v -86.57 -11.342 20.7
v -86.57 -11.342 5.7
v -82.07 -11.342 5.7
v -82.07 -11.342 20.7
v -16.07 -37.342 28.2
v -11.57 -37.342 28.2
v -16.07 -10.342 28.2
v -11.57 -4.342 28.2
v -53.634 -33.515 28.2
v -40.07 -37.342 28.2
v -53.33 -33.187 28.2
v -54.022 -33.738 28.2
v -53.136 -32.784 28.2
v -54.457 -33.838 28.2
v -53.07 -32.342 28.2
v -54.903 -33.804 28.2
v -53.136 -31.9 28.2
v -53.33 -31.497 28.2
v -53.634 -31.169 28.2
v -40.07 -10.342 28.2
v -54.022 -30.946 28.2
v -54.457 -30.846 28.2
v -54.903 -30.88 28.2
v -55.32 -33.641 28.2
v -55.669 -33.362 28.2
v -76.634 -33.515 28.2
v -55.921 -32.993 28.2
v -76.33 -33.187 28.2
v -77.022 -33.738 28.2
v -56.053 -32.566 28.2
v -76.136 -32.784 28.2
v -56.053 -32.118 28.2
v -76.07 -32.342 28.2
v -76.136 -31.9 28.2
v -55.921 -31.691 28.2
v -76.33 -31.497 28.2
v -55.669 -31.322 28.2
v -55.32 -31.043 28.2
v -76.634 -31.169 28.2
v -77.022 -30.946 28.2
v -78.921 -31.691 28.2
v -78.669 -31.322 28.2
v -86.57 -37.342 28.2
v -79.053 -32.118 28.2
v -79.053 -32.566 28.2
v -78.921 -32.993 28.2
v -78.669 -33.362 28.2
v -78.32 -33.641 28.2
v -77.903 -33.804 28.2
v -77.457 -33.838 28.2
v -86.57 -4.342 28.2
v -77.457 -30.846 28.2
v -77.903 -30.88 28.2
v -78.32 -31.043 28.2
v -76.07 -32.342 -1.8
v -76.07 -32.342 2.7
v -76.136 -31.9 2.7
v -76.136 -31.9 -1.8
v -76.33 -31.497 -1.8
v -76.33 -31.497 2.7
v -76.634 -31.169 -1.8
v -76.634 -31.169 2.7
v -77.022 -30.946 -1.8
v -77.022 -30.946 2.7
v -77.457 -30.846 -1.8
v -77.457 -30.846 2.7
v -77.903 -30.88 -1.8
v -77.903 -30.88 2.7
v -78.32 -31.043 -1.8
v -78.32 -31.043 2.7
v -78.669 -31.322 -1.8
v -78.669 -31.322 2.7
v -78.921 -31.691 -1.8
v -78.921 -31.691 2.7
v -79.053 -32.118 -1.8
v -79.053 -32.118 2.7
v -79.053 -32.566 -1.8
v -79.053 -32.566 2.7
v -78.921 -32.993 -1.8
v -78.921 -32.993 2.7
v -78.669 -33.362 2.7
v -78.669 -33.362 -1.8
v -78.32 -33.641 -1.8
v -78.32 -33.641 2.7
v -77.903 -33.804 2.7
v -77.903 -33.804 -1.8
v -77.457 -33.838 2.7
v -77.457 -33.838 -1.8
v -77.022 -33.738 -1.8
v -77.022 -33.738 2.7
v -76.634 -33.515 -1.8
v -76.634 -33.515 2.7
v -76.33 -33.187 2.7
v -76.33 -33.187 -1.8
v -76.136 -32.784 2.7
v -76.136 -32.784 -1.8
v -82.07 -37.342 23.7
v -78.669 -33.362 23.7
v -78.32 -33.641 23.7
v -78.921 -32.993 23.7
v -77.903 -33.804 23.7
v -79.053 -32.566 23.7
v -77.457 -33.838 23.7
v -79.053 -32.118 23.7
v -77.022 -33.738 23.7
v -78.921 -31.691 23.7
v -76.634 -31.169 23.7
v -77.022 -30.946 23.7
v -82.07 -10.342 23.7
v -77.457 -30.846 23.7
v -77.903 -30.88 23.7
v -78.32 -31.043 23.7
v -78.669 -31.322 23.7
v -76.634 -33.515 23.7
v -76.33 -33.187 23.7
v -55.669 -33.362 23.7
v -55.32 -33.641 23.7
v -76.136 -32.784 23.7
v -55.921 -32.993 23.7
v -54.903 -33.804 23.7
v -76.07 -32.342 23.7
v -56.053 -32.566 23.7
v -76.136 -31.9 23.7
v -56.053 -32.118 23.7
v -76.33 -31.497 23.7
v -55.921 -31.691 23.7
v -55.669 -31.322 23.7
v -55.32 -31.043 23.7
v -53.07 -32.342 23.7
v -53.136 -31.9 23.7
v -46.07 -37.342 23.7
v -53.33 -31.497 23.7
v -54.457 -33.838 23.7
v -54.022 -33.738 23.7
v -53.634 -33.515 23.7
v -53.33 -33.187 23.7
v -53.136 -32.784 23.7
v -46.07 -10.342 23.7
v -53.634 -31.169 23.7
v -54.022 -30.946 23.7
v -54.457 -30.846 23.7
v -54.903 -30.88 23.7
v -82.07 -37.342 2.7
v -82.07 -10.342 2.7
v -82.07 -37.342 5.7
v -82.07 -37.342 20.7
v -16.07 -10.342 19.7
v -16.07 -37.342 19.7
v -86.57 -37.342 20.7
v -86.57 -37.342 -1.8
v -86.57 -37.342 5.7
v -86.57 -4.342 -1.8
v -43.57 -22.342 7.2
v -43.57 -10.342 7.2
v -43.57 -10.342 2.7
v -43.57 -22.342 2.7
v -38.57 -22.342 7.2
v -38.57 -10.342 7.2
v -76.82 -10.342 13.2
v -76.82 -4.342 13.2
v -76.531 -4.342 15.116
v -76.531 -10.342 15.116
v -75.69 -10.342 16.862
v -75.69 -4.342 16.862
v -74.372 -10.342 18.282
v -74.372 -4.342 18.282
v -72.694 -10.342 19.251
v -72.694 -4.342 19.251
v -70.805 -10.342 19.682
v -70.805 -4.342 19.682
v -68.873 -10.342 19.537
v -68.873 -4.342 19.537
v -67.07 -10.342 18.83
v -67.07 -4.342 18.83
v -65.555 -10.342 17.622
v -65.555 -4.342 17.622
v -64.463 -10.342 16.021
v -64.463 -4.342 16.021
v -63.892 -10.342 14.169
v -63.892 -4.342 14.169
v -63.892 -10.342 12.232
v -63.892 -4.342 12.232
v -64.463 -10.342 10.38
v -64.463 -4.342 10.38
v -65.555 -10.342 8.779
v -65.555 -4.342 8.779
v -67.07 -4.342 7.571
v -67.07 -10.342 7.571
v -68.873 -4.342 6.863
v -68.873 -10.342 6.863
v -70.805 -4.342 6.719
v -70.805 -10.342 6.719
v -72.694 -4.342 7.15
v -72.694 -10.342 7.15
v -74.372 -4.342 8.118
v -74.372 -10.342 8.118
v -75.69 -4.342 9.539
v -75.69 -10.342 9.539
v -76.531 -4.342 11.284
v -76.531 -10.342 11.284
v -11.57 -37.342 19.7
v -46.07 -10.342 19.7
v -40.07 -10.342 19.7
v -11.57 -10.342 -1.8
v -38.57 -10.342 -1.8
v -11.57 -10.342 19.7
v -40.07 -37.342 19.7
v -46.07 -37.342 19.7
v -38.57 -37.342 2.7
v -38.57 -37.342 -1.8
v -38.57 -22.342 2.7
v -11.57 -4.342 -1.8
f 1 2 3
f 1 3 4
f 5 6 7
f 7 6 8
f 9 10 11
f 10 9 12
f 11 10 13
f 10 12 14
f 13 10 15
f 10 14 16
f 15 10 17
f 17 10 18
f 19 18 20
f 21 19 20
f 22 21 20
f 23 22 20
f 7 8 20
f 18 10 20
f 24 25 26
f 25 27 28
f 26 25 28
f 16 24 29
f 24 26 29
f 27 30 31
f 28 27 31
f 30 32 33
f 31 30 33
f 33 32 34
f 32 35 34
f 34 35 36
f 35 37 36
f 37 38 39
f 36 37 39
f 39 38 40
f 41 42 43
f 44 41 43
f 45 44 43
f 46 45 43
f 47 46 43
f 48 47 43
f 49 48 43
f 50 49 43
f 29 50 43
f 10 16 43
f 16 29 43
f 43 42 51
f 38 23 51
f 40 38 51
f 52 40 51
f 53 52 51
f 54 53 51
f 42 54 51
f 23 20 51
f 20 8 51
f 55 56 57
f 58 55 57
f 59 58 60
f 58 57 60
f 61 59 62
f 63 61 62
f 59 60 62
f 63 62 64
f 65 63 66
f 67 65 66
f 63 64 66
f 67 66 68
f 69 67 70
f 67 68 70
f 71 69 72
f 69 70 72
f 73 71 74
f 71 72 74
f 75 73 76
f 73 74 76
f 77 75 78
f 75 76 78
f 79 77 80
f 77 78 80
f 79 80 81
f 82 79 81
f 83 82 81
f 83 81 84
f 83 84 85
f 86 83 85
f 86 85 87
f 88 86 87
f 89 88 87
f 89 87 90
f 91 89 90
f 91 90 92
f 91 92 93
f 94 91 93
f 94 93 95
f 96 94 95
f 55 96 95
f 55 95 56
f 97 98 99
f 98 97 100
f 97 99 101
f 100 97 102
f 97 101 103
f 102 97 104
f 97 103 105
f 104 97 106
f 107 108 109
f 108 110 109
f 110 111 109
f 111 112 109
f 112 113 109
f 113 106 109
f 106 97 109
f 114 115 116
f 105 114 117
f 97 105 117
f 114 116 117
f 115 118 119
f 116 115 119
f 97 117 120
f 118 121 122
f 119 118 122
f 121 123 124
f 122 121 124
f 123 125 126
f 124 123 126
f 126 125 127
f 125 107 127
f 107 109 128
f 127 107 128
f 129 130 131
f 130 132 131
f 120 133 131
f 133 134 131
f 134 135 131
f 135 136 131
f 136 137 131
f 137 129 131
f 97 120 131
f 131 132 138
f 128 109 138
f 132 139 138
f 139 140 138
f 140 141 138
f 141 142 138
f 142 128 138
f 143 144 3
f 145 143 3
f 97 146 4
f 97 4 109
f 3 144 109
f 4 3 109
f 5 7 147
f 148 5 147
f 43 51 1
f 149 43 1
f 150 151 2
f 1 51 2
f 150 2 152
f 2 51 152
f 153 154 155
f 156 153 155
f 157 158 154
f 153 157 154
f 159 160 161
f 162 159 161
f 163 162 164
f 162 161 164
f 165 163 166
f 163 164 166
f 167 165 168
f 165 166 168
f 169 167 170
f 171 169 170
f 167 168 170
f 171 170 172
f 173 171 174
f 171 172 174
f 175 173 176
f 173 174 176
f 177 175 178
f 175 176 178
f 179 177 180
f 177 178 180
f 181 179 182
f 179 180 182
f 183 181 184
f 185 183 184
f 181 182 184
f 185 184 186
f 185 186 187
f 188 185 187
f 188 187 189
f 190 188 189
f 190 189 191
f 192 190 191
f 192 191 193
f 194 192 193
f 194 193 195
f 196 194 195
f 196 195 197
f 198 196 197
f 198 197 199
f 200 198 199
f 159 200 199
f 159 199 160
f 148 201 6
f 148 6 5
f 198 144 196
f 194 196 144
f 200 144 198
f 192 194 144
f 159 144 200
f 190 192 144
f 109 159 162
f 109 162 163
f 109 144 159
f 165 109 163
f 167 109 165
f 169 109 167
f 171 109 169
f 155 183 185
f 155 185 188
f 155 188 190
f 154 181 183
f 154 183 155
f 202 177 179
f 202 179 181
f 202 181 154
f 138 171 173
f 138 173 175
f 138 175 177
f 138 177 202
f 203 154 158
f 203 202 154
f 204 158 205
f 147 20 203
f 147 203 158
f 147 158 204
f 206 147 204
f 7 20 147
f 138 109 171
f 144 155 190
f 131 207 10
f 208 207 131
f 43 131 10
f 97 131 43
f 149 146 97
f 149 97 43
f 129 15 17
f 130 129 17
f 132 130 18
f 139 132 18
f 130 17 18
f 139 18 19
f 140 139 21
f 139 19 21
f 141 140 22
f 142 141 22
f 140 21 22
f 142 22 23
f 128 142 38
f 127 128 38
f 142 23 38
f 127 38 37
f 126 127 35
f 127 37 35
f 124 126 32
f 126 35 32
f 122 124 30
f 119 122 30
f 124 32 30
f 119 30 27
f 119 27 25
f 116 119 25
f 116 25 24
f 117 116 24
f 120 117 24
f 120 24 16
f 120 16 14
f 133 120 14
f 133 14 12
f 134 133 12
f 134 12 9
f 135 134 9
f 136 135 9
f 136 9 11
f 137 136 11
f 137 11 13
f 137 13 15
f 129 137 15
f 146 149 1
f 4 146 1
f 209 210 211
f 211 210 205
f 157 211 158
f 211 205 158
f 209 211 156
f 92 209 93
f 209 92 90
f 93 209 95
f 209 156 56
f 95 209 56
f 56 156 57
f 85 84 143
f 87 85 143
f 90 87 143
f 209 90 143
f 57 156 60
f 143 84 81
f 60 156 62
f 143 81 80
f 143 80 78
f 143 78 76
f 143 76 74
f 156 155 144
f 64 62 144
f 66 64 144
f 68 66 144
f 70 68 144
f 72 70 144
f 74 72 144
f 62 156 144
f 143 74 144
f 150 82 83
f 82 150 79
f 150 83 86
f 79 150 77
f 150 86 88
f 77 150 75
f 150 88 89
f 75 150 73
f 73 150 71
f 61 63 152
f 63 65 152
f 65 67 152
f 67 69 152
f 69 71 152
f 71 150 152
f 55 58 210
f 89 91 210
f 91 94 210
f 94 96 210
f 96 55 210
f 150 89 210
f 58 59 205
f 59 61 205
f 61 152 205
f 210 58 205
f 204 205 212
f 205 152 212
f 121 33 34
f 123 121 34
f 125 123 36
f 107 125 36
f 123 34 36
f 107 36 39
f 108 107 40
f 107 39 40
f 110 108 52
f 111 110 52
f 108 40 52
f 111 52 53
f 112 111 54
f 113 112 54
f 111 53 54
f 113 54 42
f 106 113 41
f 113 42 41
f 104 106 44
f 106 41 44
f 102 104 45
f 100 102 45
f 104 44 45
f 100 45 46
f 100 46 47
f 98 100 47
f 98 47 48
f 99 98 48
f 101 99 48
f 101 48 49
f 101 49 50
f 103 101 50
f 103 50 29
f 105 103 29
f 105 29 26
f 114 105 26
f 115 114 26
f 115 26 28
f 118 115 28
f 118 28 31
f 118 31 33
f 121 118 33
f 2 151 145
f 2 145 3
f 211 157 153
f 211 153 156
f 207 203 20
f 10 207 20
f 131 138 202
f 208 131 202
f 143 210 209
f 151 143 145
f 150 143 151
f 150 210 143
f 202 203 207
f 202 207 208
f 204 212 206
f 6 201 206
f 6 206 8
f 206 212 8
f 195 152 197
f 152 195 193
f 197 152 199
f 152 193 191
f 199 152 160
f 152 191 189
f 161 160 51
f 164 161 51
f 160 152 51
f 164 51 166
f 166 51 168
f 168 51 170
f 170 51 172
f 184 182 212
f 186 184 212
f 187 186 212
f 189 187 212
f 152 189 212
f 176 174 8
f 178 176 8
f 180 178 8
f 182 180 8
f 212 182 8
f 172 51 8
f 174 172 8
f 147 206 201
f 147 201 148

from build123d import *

# Parameters (mm, degrees)
SKETCH1_W           = 75
SKETCH1_H           = 30
BOSS_EXTRUDE1_DEPTH = 6
SKETCH2_W           = 4.5
SKETCH2_H           = 4.5
SKETCH2_W_2         = 38.5
SKETCH2_H_2         = 21
SKETCH2_W_3         = 5
SKETCH2_W_4         = 36
SKETCH2_W_5         = 6
SKETCH2_H_3         = 4
SKETCH2_H_4         = 8.5
BOSS_EXTRUDE4_DEPTH = 27
SKETCH7_W           = 4.5
SKETCH7_H           = 15
CUT_EXTRUDE1_DEPTH  = 6
SKETCH9_R           = 6.5
CUT_EXTRUDE2_DEPTH  = 30
SKETCH10_R          = 1.5
CUT_EXTRUDE3_DEPTH  = 50
SKETCH11_R          = 1.5
CUT_EXTRUDE4_DEPTH  = 10
SKETCH12_W          = 15
SKETCH12_H          = 26
CUT_EXTRUDE5_DEPTH  = 5


with BuildPart() as part:
    # Sketch1 → Boss-Extrude1 (new body)
    with BuildSketch(Plane.XZ.offset(4.342044015)):
        with Locations((-49.069594933, 13.200391181)):
            Rectangle(SKETCH1_W, SKETCH1_H)
    extrude(amount=BOSS_EXTRUDE1_DEPTH)

    # Sketch2 → Boss-Extrude4 (add)
    with BuildSketch(Plane(origin=(0, -10.342044015, 0), x_dir=(-1, 0, 0), z_dir=(0, -1, 0))):
        with Locations((84.319594933, -0.450391181)):
            Rectangle(SKETCH2_W, SKETCH2_H)
        with Locations((62.819594933, -0.450391181)):
            Rectangle(SKETCH2_W_2, SKETCH2_H)
        with Locations((84.319594933, -13.200391181)):
            Rectangle(SKETCH2_W, SKETCH2_H_2)
        with Locations((41.069594933, -0.450391181)):
            Rectangle(SKETCH2_W_3, SKETCH2_H)
        with Locations((84.319594933, -25.950391181)):
            Rectangle(SKETCH2_W, SKETCH2_H)
        with Locations((41.069594933, -4.950391181)):
            Rectangle(SKETCH2_W_3, SKETCH2_H)
        with Locations((64.069594933, -25.950391181)):
            Rectangle(SKETCH2_W_4, SKETCH2_H)
        with Locations((43.069594933, -25.950391181)):
            Rectangle(SKETCH2_W_5, SKETCH2_H)
        with Locations((43.069594933, -21.700391181)):
            Rectangle(SKETCH2_W_5, SKETCH2_H_3)
        with Locations((13.819594933, -23.950391181)):
            Rectangle(SKETCH2_W, SKETCH2_H_4)
    extrude(amount=BOSS_EXTRUDE4_DEPTH)

    # Sketch7 → Cut-Extrude1 (cut)
    with BuildSketch(Plane(origin=(-38.569594933, 0, 0), x_dir=(0, 0, -1), z_dir=(1, 0, 0))):
        with Locations((-4.950391181, -29.842044015)):
            Rectangle(SKETCH7_W, SKETCH7_H)
    extrude(amount=-CUT_EXTRUDE1_DEPTH, mode=Mode.SUBTRACT)

    # Sketch9 → Cut-Extrude2 (cut)
    with BuildSketch(Plane(origin=(0, -4.342044015, 0), x_dir=(1, 0, 0), z_dir=(0, 1, 0))):
        with Locations(Location((-70.319594933, -13.200391181, 0), (0, 0, 180))):
            Circle(SKETCH9_R)
    extrude(amount=-CUT_EXTRUDE2_DEPTH, mode=Mode.SUBTRACT)

    # Sketch10 → Cut-Extrude3 (cut)
    with BuildSketch(Plane.XY.offset(28.200391181)):
        with Locations((-77.569594933, -32.342044015)):
            Circle(SKETCH10_R)
    extrude(amount=-CUT_EXTRUDE3_DEPTH, mode=Mode.SUBTRACT)

    # Sketch11 → Cut-Extrude4 (cut)
    with BuildSketch(Plane.XY.offset(28.200391181)):
        with Locations((-54.569594933, -32.342044015)):
            Circle(SKETCH11_R)
    extrude(amount=-CUT_EXTRUDE4_DEPTH, mode=Mode.SUBTRACT)

    # Sketch12 → Cut-Extrude5 (cut)
    with BuildSketch(Plane.ZY.offset(86.569594933)):
        with Locations((13.200391181, -24.342044015)):
            Rectangle(SKETCH12_W, SKETCH12_H)
    extrude(amount=-CUT_EXTRUDE5_DEPTH, mode=Mode.SUBTRACT)


solid = part.part
